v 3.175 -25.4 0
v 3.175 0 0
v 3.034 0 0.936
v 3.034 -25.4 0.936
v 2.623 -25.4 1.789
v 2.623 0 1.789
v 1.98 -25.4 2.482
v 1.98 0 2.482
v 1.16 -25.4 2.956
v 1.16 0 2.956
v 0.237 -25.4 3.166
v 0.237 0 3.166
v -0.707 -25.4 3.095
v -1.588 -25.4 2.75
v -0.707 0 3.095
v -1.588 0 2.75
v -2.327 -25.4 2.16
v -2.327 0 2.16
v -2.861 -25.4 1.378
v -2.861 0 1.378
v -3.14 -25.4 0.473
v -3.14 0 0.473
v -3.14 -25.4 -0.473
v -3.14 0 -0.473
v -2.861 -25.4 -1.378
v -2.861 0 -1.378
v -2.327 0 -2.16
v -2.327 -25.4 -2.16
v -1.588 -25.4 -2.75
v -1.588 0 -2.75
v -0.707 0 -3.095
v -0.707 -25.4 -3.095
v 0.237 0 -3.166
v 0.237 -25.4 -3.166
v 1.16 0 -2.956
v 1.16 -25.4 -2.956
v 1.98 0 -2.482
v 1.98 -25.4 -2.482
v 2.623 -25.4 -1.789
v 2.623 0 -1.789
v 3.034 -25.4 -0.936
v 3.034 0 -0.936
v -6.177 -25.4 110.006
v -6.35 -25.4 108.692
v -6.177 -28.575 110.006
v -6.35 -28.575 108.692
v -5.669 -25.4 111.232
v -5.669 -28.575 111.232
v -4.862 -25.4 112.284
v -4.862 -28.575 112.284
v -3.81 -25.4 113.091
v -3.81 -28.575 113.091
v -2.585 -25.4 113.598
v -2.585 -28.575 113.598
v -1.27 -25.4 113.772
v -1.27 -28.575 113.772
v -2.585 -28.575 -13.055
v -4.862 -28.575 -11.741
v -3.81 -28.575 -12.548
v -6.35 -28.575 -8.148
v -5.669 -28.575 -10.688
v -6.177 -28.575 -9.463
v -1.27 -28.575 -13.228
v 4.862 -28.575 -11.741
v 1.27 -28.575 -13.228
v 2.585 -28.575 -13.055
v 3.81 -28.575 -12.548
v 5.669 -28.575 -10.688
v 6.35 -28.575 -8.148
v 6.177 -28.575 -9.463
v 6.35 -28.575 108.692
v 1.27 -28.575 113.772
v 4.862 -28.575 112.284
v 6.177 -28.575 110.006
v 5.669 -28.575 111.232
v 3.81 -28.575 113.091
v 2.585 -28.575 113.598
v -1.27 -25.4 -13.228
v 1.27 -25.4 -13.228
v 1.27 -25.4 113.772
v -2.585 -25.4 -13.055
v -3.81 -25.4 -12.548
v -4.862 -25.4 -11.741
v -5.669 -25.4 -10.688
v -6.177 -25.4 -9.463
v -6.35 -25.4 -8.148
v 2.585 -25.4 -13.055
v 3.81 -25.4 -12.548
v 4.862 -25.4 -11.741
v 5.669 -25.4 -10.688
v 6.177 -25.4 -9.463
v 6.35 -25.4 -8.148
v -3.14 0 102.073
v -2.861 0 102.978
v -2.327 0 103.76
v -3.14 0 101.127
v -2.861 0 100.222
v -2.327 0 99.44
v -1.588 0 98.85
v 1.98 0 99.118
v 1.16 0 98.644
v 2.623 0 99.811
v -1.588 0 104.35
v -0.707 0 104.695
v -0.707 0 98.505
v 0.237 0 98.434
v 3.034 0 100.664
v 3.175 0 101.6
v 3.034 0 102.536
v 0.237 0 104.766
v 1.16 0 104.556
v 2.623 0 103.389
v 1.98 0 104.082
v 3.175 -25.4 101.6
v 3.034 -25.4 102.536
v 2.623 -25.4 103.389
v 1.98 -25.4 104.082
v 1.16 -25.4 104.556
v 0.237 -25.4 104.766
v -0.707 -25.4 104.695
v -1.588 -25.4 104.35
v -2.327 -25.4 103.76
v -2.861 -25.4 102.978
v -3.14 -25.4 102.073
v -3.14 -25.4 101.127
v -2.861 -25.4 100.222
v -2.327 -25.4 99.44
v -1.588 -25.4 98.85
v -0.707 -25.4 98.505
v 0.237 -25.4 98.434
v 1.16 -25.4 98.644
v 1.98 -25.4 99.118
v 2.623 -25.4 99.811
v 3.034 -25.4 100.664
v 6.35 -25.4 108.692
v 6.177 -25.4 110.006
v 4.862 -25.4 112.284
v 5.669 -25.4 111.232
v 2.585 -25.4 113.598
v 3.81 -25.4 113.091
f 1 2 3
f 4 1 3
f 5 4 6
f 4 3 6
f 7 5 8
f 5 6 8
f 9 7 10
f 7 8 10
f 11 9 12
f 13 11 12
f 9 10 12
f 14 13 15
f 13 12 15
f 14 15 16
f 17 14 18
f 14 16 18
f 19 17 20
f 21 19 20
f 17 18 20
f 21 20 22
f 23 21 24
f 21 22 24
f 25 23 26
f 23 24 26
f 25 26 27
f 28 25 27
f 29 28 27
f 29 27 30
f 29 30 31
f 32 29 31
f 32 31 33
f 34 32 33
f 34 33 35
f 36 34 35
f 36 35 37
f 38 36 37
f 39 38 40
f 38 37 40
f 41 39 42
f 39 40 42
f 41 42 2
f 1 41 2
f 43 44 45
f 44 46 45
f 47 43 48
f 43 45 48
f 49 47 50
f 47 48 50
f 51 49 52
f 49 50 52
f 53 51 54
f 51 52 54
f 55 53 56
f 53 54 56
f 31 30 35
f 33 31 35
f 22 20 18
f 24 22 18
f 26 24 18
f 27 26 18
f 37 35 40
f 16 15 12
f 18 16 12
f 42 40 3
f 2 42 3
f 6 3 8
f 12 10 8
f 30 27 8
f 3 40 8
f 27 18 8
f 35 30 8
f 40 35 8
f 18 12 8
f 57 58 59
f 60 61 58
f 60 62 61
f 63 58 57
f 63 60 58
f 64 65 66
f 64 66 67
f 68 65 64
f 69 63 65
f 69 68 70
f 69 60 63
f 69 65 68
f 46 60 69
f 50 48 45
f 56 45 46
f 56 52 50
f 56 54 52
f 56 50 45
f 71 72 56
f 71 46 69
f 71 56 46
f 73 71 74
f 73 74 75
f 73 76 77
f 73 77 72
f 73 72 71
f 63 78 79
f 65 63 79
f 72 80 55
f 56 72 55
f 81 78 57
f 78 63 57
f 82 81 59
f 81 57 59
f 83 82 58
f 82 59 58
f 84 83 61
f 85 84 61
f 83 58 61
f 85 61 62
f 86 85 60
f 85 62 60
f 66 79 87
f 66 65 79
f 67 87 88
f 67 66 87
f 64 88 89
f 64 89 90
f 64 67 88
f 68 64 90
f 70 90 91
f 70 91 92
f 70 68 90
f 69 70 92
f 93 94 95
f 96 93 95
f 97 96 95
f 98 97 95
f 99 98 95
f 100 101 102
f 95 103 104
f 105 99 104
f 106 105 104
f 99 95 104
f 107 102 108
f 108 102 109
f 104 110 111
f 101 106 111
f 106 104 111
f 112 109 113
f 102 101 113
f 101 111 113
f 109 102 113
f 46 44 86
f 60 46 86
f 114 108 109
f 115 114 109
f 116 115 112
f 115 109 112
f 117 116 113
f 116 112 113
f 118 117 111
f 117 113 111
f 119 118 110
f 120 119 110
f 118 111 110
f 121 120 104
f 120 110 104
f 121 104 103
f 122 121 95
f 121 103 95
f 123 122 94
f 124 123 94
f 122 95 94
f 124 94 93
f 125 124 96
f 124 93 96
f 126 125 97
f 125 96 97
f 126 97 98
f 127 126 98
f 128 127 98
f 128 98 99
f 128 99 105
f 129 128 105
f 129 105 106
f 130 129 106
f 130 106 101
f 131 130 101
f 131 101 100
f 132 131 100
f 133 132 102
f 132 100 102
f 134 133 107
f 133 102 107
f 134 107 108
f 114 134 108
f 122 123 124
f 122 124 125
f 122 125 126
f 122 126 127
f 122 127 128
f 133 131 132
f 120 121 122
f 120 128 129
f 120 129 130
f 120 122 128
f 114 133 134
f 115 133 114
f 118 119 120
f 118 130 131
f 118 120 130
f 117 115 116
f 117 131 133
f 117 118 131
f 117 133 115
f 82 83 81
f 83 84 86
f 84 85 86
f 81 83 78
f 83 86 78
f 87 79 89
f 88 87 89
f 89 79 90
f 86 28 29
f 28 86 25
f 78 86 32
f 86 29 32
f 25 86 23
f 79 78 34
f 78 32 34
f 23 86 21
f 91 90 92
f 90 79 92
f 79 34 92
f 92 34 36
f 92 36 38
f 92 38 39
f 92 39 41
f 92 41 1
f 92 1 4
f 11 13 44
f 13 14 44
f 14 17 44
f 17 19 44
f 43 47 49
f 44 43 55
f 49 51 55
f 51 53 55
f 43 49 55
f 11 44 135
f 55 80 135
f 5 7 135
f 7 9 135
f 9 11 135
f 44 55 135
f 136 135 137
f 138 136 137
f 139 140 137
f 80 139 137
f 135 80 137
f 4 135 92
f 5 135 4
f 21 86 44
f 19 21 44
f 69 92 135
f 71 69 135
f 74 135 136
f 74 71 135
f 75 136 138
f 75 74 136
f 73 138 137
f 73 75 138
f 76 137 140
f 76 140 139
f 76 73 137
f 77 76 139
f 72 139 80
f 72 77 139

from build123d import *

# Parameters (mm, degrees)
F0_R     = 3.175
F1_DEPTH = 25.4
F3_DEPTH = 3.175
F4_R     = 5.08


with BuildPart() as f1:
    # F0 (on Front) → F1 (new body)
    with BuildSketch(Plane.XZ):
        with Locations((0, 101.6)):
            Circle(F0_R)
    extrude(amount=F1_DEPTH)


with BuildPart() as f1b:
    # F0 (on Front) → F1, piece 2 (new body)
    with BuildSketch(Plane.XZ):
        Circle(F0_R)
    extrude(amount=F1_DEPTH)

    # F2 (on face) → F3 (join)
    with BuildSketch(Plane.XZ.offset(25.4)):
        Polygon((-6.35, -13.2284704596), (0, -13.2284704596), (6.35, -13.2284704596), (6.35, 113.7715295404), (0, 113.7715295404), (-6.35, 113.7715295404), align=None)
    extrude(amount=F3_DEPTH)

    # F4
    f4_edges = [f1b.edges().sort_by_distance(p)[0] for p in [
        (-6.35, -26.9875, 113.77153),
        (6.35, -26.9875, 113.77153),
        (6.35, -26.9875, -13.22847),
        (-6.35, -26.9875, -13.22847),
    ]]
    fillet(f4_edges, radius=F4_R)


solid = Compound([f1.part, f1b.part])
